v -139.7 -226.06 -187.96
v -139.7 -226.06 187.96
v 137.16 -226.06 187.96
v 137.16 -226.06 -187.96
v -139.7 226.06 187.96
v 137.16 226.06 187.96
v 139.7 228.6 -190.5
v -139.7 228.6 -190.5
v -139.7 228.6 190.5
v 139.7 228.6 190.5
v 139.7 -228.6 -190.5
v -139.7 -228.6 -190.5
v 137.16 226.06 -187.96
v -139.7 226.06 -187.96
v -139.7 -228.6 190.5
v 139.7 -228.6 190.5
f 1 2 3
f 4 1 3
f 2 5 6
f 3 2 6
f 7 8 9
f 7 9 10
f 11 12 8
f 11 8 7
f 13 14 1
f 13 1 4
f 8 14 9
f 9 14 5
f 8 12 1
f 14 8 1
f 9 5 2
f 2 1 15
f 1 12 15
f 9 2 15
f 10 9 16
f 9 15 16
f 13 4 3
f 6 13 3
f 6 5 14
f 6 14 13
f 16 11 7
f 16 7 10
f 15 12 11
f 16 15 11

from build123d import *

# Parameters (mm, degrees)
F0_W     = 279.4
F0_H     = 381
F1_DEPTH = 228.6
F2_T     = -2.54


with BuildPart() as f1:
    # F0 (on Front) → F1 (new body, symmetric)
    with BuildSketch(Plane.XZ):
        Rectangle(F0_W, F0_H)
    extrude(amount=F1_DEPTH, both=True)

    # F2
    f2_openings = [f1.faces().sort_by_distance(p)[0] for p in [
        (-139.7, 0, 0),
    ]]
    offset(amount=F2_T, openings=f2_openings)


solid = f1.part
